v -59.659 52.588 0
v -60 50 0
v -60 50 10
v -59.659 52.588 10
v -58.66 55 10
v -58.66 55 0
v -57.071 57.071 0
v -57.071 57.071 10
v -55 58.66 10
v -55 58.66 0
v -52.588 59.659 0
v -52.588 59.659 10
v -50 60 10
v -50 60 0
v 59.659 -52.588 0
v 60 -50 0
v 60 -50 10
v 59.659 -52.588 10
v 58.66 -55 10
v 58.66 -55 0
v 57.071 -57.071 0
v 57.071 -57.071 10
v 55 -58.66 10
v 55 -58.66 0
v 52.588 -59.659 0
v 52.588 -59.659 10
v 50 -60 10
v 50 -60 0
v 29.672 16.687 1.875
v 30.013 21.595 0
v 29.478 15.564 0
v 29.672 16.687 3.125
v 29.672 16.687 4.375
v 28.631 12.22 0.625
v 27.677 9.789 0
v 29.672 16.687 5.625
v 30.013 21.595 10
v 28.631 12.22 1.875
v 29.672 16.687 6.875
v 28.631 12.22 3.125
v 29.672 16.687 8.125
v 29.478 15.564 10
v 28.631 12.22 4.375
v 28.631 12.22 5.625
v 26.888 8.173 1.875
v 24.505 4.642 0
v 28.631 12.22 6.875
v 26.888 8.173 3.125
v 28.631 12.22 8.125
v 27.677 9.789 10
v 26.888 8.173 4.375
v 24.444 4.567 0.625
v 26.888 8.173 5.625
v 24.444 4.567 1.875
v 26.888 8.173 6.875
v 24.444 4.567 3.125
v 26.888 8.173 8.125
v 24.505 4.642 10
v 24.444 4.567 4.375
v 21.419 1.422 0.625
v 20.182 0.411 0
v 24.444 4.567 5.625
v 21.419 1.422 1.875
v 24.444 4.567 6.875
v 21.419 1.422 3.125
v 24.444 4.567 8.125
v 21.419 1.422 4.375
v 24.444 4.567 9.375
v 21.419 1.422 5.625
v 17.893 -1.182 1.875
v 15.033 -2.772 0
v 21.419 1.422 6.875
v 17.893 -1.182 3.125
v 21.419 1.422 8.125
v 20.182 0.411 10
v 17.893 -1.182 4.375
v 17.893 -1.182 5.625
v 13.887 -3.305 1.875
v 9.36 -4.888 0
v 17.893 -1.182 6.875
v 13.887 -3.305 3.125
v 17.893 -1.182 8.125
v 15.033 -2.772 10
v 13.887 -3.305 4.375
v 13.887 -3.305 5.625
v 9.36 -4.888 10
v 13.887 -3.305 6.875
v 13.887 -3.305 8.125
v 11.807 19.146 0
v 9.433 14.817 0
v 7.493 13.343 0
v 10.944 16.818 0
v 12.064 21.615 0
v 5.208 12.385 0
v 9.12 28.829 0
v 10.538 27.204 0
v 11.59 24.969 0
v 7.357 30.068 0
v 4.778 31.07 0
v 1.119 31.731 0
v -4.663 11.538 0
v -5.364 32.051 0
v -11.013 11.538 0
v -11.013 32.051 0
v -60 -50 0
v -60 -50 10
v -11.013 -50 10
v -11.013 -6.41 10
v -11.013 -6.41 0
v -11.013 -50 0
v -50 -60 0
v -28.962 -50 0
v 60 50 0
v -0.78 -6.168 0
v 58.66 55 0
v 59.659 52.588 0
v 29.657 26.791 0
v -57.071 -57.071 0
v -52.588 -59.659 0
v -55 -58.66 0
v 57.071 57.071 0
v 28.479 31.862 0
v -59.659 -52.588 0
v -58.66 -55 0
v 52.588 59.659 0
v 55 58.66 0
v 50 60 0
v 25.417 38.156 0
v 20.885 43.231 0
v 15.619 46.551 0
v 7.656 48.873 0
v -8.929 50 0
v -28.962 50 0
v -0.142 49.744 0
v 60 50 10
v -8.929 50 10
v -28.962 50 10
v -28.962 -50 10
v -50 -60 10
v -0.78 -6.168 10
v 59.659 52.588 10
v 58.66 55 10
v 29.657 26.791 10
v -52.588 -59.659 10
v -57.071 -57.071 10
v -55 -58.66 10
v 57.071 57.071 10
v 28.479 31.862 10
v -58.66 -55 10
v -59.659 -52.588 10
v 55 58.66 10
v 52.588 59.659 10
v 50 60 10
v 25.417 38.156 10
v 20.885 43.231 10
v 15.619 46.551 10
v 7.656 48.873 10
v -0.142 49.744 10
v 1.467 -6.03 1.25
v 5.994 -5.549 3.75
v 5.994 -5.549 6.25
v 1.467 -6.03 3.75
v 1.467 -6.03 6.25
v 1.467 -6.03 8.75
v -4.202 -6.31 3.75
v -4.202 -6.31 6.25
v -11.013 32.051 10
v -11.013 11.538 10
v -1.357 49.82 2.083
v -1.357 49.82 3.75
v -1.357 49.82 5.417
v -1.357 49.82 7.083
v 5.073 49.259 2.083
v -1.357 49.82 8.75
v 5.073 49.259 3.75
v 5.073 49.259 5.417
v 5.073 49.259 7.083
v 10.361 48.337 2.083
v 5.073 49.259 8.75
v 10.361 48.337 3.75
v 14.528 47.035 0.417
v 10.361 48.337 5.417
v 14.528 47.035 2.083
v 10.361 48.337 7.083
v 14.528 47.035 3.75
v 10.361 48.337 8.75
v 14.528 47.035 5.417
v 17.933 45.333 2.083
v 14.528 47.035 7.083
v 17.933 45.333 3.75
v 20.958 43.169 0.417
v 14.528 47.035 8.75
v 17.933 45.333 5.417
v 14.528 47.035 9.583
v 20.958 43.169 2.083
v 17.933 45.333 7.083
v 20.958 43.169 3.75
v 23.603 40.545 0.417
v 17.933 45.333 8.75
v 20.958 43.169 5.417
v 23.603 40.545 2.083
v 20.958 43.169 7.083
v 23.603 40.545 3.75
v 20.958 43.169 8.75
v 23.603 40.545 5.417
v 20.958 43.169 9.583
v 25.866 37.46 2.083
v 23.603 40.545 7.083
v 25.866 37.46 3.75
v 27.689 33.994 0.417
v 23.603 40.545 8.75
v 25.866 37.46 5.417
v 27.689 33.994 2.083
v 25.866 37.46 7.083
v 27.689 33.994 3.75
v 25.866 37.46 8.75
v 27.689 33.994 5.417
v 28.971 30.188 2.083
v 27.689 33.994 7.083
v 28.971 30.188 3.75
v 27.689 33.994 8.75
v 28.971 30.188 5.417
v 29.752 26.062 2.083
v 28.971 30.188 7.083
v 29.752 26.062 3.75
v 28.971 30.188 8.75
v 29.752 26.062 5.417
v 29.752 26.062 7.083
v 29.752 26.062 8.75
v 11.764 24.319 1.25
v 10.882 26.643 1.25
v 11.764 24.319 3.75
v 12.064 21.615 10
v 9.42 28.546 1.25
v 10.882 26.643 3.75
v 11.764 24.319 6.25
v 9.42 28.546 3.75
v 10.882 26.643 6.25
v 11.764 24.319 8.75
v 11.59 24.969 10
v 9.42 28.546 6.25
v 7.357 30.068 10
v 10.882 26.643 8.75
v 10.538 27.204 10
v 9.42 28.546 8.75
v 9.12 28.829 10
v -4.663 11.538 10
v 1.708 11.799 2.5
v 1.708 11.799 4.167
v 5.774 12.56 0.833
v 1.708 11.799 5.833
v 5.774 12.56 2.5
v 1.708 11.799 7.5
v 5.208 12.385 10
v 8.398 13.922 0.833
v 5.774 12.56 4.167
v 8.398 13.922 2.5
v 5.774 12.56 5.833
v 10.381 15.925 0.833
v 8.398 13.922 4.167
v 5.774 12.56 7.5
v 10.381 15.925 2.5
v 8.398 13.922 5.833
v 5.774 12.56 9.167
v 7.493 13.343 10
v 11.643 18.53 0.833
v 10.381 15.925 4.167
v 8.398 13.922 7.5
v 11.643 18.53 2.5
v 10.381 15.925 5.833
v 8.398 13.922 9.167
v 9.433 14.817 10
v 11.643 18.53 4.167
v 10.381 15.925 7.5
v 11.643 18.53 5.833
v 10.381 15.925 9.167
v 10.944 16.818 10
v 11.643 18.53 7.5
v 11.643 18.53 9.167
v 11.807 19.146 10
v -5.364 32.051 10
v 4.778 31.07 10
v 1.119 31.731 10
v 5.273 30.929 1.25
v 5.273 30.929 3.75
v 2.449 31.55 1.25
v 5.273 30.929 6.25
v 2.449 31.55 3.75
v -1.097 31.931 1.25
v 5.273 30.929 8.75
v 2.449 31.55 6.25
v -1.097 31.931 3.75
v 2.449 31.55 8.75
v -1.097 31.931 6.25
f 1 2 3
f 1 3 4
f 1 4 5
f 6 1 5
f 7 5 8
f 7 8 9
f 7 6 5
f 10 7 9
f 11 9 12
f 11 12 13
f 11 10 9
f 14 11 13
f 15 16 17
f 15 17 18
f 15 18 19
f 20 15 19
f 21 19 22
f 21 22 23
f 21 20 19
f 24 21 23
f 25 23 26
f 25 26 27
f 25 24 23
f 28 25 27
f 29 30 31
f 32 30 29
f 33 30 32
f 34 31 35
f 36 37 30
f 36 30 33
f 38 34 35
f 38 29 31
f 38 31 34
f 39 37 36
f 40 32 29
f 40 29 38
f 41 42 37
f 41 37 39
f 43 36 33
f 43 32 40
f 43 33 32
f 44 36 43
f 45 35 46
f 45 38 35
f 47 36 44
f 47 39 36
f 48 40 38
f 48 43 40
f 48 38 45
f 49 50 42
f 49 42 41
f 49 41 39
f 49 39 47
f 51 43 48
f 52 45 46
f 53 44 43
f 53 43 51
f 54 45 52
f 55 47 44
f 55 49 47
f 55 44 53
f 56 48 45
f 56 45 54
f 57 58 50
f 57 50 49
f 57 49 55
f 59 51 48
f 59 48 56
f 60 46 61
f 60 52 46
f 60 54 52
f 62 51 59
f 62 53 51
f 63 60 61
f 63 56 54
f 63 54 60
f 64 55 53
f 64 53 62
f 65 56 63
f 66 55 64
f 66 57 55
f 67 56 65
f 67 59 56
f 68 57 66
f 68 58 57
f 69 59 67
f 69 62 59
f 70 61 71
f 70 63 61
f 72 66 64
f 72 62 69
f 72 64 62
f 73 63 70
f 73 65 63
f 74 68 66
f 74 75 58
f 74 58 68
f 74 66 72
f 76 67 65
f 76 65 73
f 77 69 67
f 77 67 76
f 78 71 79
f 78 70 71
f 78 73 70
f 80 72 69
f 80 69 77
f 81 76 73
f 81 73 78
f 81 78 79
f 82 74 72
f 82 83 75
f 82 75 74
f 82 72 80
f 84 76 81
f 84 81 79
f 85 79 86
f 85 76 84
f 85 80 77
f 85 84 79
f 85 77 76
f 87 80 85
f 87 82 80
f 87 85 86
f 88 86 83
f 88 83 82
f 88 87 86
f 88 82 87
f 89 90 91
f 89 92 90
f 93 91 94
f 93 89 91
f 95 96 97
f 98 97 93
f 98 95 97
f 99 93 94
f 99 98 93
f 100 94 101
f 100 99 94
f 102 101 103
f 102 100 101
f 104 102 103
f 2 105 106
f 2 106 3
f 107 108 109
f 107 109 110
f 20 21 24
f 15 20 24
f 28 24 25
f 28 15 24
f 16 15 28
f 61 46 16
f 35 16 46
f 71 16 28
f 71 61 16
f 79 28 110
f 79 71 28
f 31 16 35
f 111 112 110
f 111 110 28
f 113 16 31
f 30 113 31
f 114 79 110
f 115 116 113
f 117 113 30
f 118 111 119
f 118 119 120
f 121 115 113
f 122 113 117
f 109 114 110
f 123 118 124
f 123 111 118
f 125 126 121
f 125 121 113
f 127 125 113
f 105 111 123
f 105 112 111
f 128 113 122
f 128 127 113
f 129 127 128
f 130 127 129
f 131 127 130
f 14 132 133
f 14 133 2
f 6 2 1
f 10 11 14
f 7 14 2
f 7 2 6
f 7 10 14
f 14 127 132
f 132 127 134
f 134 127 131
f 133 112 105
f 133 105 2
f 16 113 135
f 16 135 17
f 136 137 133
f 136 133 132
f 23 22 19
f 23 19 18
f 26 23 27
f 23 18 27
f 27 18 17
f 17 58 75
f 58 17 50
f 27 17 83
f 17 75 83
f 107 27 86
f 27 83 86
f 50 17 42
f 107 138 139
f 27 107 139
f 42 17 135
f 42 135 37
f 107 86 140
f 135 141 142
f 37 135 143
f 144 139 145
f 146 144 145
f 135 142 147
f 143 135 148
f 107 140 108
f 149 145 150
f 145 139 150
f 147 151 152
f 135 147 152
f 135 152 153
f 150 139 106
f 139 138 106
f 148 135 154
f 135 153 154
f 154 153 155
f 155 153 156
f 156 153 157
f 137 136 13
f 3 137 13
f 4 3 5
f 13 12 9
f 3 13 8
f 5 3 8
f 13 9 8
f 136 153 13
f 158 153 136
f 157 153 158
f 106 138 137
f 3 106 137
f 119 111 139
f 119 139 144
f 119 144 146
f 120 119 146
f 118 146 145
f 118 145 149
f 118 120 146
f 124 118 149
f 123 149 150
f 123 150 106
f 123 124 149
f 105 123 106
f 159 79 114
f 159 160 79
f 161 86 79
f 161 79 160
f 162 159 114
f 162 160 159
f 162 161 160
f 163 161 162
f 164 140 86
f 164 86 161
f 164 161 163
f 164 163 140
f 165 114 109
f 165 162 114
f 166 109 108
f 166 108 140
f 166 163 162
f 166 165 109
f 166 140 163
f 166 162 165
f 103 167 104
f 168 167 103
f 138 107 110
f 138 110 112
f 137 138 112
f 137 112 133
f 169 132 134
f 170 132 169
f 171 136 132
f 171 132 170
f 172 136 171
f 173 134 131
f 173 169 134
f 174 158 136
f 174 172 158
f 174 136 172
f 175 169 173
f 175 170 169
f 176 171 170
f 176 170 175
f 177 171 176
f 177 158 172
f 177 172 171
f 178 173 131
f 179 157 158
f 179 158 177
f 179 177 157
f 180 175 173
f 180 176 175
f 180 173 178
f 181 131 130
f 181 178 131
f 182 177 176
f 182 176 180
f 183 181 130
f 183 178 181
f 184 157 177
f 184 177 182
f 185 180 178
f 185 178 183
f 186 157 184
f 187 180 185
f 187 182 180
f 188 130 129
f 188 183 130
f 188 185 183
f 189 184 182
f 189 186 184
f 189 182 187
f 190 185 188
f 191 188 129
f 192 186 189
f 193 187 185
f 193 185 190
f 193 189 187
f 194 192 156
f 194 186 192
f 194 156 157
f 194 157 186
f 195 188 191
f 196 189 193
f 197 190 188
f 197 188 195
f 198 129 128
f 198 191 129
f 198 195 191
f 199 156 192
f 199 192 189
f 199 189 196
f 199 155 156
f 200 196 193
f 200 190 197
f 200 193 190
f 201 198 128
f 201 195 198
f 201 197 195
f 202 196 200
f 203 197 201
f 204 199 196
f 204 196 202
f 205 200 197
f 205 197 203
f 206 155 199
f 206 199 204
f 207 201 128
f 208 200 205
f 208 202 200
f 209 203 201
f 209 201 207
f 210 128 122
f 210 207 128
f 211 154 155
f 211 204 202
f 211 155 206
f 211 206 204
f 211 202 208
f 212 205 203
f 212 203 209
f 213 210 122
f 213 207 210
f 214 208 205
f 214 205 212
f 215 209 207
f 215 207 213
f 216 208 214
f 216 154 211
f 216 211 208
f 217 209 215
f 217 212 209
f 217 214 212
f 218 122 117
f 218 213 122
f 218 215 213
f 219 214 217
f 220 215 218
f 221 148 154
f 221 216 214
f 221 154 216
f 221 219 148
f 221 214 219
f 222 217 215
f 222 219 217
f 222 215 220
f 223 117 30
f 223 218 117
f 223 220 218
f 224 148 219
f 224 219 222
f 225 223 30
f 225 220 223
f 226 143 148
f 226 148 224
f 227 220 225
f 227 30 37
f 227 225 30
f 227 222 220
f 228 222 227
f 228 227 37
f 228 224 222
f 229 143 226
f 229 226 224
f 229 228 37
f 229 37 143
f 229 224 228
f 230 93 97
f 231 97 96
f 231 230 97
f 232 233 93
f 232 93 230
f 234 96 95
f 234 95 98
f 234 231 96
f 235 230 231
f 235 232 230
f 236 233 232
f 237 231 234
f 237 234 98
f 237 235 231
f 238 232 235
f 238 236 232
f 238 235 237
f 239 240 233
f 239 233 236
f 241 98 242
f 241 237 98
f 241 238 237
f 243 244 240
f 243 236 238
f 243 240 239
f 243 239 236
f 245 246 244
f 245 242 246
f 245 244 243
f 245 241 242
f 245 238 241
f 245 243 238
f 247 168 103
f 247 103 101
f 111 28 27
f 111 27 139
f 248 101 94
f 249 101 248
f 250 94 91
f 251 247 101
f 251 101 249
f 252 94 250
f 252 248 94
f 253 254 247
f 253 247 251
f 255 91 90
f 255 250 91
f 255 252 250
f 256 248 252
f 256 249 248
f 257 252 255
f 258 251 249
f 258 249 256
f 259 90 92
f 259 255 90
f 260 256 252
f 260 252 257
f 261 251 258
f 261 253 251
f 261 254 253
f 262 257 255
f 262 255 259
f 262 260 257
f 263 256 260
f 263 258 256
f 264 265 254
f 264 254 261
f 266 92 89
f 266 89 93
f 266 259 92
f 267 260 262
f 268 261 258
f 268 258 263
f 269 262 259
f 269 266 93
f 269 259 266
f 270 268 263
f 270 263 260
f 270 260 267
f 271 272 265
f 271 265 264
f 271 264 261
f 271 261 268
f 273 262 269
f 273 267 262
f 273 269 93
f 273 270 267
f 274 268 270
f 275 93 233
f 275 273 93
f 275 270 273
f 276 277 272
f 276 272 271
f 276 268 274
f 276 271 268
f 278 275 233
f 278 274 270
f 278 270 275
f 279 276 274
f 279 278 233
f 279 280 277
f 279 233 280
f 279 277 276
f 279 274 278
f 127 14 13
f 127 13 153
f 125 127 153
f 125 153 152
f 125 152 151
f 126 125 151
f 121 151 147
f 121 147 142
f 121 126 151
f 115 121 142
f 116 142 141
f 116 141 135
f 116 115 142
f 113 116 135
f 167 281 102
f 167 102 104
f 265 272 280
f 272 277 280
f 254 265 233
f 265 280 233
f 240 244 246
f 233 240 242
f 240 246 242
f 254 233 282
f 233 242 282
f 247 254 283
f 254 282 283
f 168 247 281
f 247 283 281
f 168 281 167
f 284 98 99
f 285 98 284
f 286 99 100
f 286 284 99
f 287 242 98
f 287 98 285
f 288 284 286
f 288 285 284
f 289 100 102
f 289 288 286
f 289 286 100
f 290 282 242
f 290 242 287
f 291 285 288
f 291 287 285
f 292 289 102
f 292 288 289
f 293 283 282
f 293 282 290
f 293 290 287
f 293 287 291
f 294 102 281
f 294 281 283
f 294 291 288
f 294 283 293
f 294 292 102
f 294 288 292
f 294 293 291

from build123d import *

# Parameters (mm, degrees)
BOSS_EXTRUDE1_DEPTH = 10
CUT_EXTRUDE29_DEPTH = 10


with BuildPart() as part:
    # Sketch1 → Boss-Extrude1 (new body)
    with BuildSketch(Plane.XY):
        with BuildLine():
            Line((-50, 60), (50, 60))
            ThreePointArc((50, 60), (57.071067812, 57.071067812), (60, 50))
            Line((60, 50), (60, -50))
            ThreePointArc((60, -50), (57.071067812, -57.071067812), (50, -60))
            Line((50, -60), (-50, -60))
            ThreePointArc((-50, -60), (-57.071067812, -57.071067812), (-60, -50))
            Line((-60, -50), (-60, 50))
            ThreePointArc((-60, 50), (-57.071067812, 57.071067812), (-50, 60))
        make_face()
    extrude(amount=BOSS_EXTRUDE1_DEPTH)

    # Sketch2 → Cut-Extrude29 (cut)
    with BuildSketch(Plane.XY.offset(10)):
        with BuildLine():
            Line((-28.961538462, 50), (-8.929487179, 50))
            add(Edge.make_bspline(
                [(-8.929487179, 50), (-7.620618936, 49.994141227), (-5.095537738, 49.982838426), (-1.454162904, 49.845776931), (1.905183672, 49.600154382), (4.981730185, 49.296603755), (7.774211636, 48.871037587), (10.286125049, 48.383159297), (12.517991706, 47.788781545), (14.494979223, 47.083263391), (16.269261659, 46.251485051), (17.948305103, 45.365581747), (19.494162988, 44.308287399), (20.984859429, 43.193552701), (22.335168741, 41.914887476), (23.629331304, 40.557388751), (24.812535801, 39.067219241), (25.890264764, 37.462417049), (26.867930999, 35.772632056), (27.722085625, 33.994843429), (28.414928025, 32.126238002), (28.996136647, 30.178903528), (29.462969075, 28.152924877), (29.7737076, 26.035842099), (29.984776838, 23.842437471), (30.003400784, 22.349604897), (30.012820513, 21.594551282)],
                knots=[0, 0, 0, 0, 1.698747864, 3.27724071, 4.728299578, 6.070144658, 7.288476769, 8.393259625, 9.389771311, 10.283485332, 11.113357557, 11.931608583, 12.74405601, 13.541433047, 14.344816069, 15.154114104, 15.974336324, 16.810834471, 17.661136416, 18.50621059, 19.367396281, 20.244825668, 21.142564693, 22.063065223, 23.020325768, 24, 24, 24, 24], degree=3))
            add(Edge.make_bspline(
                [(30.012820513, 21.594551282), (29.999191345, 20.759253445), (29.972408355, 19.117790551), (29.709848746, 16.711607332), (29.261313979, 14.417529485), (28.6751025, 12.216210642), (27.857672281, 10.143867376), (26.923796642, 8.151052942), (25.77483339, 6.293639738), (24.461959194, 4.548393764), (23.028150794, 2.901125345), (21.439369639, 1.399396242), (19.725898582, 0.03296922), (17.897656293, -1.212475984), (15.947779001, -2.334427029), (13.877673639, -3.343389794), (11.673204355, -4.207094523), (10.13807827, -4.658805102), (9.359775641, -4.887820513)],
                knots=[0, 0, 0, 0, 1.102006807, 2.165578795, 3.188629044, 4.184801286, 5.166646146, 6.124351954, 7.085497154, 8.042432466, 9.003981491, 9.963833307, 10.922997304, 11.89326795, 12.880200226, 13.889073926, 14.929769137, 16, 16, 16, 16], degree=3))
            add(Edge.make_bspline(
                [(9.359775641, -4.887820513), (8.847140758, -5.015364901), (7.736608523, -5.291667119), (5.898982698, -5.572183219), (3.781311876, -5.830100526), (1.376748242, -6.051749227), (-1.316094491, -6.202418697), (-4.294608949, -6.320084852), (-7.560144946, -6.405640299), (-9.830869546, -6.408676181), (-11.012820513, -6.41025641)],
                knots=[0, 0, 0, 0, 0.618981996, 1.340914327, 2.176866532, 3.120127938, 4.170906482, 5.338178032, 6.614476169, 8, 8, 8, 8], degree=3))
            Line((-11.012820513, -6.41025641), (-11.012820513, -50))
            Line((-11.012820513, -50), (-28.961538462, -50))
            Line((-28.961538462, -50), (-28.961538462, 50))
        make_face()
        with BuildLine():
            Line((-11.012820513, 11.538461538), (-4.662660256, 11.538461538))
            add(Edge.make_bspline(
                [(-4.662660256, 11.538461538), (-3.507148343, 11.545788381), (-1.380989256, 11.55926988), (1.522593241, 11.75422019), (3.855967987, 12.051948691), (5.699377367, 12.478960217), (7.154923674, 13.127006749), (8.410241237, 13.876674553), (9.486959158, 14.824608912), (10.419238402, 15.907786113), (11.16456756, 17.152411006), (11.681414511, 18.538217292), (12.017148129, 20.036087696), (12.048156247, 21.078506356), (12.064102564, 21.614583333)],
                knots=[0, 0, 0, 0, 1.8619151, 3.425951444, 4.686033666, 5.651700536, 6.461346321, 7.243864085, 7.999046032, 8.762387399, 9.539336099, 10.322741239, 11.137448474, 12, 12, 12, 12], degree=3))
            add(Edge.make_bspline(
                [(12.064102564, 21.614583333), (12.048320277, 22.082946807), (12.017698846, 22.991684556), (11.792745473, 24.30321853), (11.434234506, 25.525838751), (10.914765898, 26.646776569), (10.243215991, 27.664127333), (9.424460756, 28.577490271), (8.469006429, 29.406425825), (7.731339827, 29.845194075), (7.356570513, 30.068108974)],
                knots=[0, 0, 0, 0, 1.102301479, 2.1387299, 3.123554645, 4.094223062, 5.036071848, 5.982632524, 6.975082478, 8, 8, 8, 8], degree=3))
            add(Edge.make_bspline(
                [(7.356570513, 30.068108974), (7.03911927, 30.228653171), (6.367009937, 30.568558133), (5.222342581, 30.963722505), (3.901413931, 31.297087184), (2.39530623, 31.573776649), (0.710027777, 31.788516408), (-1.154120751, 31.952738604), (-3.19988262, 32.018778746), (-4.622587592, 32.040148784), (-5.363782051, 32.051282051)],
                knots=[0, 0, 0, 0, 0.656809284, 1.390599849, 2.23162475, 3.173112763, 4.218524733, 5.370385145, 6.63003504, 8, 8, 8, 8], degree=3))
            Line((-5.363782051, 32.051282051), (-11.012820513, 32.051282051))
            Line((-11.012820513, 32.051282051), (-11.012820513, 11.538461538))
        make_face(mode=Mode.SUBTRACT)
    extrude(amount=-CUT_EXTRUDE29_DEPTH, mode=Mode.SUBTRACT)


with BuildPart() as cut_extrude29_piece_1:
    # of the separate pieces the step leaves, piece 1, a body of its own (cut_extrude29_pieces)
    add(part.part.solids().sort_by_distance((-50, 60, 0))[0])


with BuildPart() as cut_extrude29_piece_2:
    # of the separate pieces the step leaves, piece 2, a body of its own (cut_extrude29_pieces)
    add(part.part.solids().sort_by_distance((-11.012820513, 11.538461538, 0))[0])


solid = Compound([cut_extrude29_piece_1.part, cut_extrude29_piece_2.part])
